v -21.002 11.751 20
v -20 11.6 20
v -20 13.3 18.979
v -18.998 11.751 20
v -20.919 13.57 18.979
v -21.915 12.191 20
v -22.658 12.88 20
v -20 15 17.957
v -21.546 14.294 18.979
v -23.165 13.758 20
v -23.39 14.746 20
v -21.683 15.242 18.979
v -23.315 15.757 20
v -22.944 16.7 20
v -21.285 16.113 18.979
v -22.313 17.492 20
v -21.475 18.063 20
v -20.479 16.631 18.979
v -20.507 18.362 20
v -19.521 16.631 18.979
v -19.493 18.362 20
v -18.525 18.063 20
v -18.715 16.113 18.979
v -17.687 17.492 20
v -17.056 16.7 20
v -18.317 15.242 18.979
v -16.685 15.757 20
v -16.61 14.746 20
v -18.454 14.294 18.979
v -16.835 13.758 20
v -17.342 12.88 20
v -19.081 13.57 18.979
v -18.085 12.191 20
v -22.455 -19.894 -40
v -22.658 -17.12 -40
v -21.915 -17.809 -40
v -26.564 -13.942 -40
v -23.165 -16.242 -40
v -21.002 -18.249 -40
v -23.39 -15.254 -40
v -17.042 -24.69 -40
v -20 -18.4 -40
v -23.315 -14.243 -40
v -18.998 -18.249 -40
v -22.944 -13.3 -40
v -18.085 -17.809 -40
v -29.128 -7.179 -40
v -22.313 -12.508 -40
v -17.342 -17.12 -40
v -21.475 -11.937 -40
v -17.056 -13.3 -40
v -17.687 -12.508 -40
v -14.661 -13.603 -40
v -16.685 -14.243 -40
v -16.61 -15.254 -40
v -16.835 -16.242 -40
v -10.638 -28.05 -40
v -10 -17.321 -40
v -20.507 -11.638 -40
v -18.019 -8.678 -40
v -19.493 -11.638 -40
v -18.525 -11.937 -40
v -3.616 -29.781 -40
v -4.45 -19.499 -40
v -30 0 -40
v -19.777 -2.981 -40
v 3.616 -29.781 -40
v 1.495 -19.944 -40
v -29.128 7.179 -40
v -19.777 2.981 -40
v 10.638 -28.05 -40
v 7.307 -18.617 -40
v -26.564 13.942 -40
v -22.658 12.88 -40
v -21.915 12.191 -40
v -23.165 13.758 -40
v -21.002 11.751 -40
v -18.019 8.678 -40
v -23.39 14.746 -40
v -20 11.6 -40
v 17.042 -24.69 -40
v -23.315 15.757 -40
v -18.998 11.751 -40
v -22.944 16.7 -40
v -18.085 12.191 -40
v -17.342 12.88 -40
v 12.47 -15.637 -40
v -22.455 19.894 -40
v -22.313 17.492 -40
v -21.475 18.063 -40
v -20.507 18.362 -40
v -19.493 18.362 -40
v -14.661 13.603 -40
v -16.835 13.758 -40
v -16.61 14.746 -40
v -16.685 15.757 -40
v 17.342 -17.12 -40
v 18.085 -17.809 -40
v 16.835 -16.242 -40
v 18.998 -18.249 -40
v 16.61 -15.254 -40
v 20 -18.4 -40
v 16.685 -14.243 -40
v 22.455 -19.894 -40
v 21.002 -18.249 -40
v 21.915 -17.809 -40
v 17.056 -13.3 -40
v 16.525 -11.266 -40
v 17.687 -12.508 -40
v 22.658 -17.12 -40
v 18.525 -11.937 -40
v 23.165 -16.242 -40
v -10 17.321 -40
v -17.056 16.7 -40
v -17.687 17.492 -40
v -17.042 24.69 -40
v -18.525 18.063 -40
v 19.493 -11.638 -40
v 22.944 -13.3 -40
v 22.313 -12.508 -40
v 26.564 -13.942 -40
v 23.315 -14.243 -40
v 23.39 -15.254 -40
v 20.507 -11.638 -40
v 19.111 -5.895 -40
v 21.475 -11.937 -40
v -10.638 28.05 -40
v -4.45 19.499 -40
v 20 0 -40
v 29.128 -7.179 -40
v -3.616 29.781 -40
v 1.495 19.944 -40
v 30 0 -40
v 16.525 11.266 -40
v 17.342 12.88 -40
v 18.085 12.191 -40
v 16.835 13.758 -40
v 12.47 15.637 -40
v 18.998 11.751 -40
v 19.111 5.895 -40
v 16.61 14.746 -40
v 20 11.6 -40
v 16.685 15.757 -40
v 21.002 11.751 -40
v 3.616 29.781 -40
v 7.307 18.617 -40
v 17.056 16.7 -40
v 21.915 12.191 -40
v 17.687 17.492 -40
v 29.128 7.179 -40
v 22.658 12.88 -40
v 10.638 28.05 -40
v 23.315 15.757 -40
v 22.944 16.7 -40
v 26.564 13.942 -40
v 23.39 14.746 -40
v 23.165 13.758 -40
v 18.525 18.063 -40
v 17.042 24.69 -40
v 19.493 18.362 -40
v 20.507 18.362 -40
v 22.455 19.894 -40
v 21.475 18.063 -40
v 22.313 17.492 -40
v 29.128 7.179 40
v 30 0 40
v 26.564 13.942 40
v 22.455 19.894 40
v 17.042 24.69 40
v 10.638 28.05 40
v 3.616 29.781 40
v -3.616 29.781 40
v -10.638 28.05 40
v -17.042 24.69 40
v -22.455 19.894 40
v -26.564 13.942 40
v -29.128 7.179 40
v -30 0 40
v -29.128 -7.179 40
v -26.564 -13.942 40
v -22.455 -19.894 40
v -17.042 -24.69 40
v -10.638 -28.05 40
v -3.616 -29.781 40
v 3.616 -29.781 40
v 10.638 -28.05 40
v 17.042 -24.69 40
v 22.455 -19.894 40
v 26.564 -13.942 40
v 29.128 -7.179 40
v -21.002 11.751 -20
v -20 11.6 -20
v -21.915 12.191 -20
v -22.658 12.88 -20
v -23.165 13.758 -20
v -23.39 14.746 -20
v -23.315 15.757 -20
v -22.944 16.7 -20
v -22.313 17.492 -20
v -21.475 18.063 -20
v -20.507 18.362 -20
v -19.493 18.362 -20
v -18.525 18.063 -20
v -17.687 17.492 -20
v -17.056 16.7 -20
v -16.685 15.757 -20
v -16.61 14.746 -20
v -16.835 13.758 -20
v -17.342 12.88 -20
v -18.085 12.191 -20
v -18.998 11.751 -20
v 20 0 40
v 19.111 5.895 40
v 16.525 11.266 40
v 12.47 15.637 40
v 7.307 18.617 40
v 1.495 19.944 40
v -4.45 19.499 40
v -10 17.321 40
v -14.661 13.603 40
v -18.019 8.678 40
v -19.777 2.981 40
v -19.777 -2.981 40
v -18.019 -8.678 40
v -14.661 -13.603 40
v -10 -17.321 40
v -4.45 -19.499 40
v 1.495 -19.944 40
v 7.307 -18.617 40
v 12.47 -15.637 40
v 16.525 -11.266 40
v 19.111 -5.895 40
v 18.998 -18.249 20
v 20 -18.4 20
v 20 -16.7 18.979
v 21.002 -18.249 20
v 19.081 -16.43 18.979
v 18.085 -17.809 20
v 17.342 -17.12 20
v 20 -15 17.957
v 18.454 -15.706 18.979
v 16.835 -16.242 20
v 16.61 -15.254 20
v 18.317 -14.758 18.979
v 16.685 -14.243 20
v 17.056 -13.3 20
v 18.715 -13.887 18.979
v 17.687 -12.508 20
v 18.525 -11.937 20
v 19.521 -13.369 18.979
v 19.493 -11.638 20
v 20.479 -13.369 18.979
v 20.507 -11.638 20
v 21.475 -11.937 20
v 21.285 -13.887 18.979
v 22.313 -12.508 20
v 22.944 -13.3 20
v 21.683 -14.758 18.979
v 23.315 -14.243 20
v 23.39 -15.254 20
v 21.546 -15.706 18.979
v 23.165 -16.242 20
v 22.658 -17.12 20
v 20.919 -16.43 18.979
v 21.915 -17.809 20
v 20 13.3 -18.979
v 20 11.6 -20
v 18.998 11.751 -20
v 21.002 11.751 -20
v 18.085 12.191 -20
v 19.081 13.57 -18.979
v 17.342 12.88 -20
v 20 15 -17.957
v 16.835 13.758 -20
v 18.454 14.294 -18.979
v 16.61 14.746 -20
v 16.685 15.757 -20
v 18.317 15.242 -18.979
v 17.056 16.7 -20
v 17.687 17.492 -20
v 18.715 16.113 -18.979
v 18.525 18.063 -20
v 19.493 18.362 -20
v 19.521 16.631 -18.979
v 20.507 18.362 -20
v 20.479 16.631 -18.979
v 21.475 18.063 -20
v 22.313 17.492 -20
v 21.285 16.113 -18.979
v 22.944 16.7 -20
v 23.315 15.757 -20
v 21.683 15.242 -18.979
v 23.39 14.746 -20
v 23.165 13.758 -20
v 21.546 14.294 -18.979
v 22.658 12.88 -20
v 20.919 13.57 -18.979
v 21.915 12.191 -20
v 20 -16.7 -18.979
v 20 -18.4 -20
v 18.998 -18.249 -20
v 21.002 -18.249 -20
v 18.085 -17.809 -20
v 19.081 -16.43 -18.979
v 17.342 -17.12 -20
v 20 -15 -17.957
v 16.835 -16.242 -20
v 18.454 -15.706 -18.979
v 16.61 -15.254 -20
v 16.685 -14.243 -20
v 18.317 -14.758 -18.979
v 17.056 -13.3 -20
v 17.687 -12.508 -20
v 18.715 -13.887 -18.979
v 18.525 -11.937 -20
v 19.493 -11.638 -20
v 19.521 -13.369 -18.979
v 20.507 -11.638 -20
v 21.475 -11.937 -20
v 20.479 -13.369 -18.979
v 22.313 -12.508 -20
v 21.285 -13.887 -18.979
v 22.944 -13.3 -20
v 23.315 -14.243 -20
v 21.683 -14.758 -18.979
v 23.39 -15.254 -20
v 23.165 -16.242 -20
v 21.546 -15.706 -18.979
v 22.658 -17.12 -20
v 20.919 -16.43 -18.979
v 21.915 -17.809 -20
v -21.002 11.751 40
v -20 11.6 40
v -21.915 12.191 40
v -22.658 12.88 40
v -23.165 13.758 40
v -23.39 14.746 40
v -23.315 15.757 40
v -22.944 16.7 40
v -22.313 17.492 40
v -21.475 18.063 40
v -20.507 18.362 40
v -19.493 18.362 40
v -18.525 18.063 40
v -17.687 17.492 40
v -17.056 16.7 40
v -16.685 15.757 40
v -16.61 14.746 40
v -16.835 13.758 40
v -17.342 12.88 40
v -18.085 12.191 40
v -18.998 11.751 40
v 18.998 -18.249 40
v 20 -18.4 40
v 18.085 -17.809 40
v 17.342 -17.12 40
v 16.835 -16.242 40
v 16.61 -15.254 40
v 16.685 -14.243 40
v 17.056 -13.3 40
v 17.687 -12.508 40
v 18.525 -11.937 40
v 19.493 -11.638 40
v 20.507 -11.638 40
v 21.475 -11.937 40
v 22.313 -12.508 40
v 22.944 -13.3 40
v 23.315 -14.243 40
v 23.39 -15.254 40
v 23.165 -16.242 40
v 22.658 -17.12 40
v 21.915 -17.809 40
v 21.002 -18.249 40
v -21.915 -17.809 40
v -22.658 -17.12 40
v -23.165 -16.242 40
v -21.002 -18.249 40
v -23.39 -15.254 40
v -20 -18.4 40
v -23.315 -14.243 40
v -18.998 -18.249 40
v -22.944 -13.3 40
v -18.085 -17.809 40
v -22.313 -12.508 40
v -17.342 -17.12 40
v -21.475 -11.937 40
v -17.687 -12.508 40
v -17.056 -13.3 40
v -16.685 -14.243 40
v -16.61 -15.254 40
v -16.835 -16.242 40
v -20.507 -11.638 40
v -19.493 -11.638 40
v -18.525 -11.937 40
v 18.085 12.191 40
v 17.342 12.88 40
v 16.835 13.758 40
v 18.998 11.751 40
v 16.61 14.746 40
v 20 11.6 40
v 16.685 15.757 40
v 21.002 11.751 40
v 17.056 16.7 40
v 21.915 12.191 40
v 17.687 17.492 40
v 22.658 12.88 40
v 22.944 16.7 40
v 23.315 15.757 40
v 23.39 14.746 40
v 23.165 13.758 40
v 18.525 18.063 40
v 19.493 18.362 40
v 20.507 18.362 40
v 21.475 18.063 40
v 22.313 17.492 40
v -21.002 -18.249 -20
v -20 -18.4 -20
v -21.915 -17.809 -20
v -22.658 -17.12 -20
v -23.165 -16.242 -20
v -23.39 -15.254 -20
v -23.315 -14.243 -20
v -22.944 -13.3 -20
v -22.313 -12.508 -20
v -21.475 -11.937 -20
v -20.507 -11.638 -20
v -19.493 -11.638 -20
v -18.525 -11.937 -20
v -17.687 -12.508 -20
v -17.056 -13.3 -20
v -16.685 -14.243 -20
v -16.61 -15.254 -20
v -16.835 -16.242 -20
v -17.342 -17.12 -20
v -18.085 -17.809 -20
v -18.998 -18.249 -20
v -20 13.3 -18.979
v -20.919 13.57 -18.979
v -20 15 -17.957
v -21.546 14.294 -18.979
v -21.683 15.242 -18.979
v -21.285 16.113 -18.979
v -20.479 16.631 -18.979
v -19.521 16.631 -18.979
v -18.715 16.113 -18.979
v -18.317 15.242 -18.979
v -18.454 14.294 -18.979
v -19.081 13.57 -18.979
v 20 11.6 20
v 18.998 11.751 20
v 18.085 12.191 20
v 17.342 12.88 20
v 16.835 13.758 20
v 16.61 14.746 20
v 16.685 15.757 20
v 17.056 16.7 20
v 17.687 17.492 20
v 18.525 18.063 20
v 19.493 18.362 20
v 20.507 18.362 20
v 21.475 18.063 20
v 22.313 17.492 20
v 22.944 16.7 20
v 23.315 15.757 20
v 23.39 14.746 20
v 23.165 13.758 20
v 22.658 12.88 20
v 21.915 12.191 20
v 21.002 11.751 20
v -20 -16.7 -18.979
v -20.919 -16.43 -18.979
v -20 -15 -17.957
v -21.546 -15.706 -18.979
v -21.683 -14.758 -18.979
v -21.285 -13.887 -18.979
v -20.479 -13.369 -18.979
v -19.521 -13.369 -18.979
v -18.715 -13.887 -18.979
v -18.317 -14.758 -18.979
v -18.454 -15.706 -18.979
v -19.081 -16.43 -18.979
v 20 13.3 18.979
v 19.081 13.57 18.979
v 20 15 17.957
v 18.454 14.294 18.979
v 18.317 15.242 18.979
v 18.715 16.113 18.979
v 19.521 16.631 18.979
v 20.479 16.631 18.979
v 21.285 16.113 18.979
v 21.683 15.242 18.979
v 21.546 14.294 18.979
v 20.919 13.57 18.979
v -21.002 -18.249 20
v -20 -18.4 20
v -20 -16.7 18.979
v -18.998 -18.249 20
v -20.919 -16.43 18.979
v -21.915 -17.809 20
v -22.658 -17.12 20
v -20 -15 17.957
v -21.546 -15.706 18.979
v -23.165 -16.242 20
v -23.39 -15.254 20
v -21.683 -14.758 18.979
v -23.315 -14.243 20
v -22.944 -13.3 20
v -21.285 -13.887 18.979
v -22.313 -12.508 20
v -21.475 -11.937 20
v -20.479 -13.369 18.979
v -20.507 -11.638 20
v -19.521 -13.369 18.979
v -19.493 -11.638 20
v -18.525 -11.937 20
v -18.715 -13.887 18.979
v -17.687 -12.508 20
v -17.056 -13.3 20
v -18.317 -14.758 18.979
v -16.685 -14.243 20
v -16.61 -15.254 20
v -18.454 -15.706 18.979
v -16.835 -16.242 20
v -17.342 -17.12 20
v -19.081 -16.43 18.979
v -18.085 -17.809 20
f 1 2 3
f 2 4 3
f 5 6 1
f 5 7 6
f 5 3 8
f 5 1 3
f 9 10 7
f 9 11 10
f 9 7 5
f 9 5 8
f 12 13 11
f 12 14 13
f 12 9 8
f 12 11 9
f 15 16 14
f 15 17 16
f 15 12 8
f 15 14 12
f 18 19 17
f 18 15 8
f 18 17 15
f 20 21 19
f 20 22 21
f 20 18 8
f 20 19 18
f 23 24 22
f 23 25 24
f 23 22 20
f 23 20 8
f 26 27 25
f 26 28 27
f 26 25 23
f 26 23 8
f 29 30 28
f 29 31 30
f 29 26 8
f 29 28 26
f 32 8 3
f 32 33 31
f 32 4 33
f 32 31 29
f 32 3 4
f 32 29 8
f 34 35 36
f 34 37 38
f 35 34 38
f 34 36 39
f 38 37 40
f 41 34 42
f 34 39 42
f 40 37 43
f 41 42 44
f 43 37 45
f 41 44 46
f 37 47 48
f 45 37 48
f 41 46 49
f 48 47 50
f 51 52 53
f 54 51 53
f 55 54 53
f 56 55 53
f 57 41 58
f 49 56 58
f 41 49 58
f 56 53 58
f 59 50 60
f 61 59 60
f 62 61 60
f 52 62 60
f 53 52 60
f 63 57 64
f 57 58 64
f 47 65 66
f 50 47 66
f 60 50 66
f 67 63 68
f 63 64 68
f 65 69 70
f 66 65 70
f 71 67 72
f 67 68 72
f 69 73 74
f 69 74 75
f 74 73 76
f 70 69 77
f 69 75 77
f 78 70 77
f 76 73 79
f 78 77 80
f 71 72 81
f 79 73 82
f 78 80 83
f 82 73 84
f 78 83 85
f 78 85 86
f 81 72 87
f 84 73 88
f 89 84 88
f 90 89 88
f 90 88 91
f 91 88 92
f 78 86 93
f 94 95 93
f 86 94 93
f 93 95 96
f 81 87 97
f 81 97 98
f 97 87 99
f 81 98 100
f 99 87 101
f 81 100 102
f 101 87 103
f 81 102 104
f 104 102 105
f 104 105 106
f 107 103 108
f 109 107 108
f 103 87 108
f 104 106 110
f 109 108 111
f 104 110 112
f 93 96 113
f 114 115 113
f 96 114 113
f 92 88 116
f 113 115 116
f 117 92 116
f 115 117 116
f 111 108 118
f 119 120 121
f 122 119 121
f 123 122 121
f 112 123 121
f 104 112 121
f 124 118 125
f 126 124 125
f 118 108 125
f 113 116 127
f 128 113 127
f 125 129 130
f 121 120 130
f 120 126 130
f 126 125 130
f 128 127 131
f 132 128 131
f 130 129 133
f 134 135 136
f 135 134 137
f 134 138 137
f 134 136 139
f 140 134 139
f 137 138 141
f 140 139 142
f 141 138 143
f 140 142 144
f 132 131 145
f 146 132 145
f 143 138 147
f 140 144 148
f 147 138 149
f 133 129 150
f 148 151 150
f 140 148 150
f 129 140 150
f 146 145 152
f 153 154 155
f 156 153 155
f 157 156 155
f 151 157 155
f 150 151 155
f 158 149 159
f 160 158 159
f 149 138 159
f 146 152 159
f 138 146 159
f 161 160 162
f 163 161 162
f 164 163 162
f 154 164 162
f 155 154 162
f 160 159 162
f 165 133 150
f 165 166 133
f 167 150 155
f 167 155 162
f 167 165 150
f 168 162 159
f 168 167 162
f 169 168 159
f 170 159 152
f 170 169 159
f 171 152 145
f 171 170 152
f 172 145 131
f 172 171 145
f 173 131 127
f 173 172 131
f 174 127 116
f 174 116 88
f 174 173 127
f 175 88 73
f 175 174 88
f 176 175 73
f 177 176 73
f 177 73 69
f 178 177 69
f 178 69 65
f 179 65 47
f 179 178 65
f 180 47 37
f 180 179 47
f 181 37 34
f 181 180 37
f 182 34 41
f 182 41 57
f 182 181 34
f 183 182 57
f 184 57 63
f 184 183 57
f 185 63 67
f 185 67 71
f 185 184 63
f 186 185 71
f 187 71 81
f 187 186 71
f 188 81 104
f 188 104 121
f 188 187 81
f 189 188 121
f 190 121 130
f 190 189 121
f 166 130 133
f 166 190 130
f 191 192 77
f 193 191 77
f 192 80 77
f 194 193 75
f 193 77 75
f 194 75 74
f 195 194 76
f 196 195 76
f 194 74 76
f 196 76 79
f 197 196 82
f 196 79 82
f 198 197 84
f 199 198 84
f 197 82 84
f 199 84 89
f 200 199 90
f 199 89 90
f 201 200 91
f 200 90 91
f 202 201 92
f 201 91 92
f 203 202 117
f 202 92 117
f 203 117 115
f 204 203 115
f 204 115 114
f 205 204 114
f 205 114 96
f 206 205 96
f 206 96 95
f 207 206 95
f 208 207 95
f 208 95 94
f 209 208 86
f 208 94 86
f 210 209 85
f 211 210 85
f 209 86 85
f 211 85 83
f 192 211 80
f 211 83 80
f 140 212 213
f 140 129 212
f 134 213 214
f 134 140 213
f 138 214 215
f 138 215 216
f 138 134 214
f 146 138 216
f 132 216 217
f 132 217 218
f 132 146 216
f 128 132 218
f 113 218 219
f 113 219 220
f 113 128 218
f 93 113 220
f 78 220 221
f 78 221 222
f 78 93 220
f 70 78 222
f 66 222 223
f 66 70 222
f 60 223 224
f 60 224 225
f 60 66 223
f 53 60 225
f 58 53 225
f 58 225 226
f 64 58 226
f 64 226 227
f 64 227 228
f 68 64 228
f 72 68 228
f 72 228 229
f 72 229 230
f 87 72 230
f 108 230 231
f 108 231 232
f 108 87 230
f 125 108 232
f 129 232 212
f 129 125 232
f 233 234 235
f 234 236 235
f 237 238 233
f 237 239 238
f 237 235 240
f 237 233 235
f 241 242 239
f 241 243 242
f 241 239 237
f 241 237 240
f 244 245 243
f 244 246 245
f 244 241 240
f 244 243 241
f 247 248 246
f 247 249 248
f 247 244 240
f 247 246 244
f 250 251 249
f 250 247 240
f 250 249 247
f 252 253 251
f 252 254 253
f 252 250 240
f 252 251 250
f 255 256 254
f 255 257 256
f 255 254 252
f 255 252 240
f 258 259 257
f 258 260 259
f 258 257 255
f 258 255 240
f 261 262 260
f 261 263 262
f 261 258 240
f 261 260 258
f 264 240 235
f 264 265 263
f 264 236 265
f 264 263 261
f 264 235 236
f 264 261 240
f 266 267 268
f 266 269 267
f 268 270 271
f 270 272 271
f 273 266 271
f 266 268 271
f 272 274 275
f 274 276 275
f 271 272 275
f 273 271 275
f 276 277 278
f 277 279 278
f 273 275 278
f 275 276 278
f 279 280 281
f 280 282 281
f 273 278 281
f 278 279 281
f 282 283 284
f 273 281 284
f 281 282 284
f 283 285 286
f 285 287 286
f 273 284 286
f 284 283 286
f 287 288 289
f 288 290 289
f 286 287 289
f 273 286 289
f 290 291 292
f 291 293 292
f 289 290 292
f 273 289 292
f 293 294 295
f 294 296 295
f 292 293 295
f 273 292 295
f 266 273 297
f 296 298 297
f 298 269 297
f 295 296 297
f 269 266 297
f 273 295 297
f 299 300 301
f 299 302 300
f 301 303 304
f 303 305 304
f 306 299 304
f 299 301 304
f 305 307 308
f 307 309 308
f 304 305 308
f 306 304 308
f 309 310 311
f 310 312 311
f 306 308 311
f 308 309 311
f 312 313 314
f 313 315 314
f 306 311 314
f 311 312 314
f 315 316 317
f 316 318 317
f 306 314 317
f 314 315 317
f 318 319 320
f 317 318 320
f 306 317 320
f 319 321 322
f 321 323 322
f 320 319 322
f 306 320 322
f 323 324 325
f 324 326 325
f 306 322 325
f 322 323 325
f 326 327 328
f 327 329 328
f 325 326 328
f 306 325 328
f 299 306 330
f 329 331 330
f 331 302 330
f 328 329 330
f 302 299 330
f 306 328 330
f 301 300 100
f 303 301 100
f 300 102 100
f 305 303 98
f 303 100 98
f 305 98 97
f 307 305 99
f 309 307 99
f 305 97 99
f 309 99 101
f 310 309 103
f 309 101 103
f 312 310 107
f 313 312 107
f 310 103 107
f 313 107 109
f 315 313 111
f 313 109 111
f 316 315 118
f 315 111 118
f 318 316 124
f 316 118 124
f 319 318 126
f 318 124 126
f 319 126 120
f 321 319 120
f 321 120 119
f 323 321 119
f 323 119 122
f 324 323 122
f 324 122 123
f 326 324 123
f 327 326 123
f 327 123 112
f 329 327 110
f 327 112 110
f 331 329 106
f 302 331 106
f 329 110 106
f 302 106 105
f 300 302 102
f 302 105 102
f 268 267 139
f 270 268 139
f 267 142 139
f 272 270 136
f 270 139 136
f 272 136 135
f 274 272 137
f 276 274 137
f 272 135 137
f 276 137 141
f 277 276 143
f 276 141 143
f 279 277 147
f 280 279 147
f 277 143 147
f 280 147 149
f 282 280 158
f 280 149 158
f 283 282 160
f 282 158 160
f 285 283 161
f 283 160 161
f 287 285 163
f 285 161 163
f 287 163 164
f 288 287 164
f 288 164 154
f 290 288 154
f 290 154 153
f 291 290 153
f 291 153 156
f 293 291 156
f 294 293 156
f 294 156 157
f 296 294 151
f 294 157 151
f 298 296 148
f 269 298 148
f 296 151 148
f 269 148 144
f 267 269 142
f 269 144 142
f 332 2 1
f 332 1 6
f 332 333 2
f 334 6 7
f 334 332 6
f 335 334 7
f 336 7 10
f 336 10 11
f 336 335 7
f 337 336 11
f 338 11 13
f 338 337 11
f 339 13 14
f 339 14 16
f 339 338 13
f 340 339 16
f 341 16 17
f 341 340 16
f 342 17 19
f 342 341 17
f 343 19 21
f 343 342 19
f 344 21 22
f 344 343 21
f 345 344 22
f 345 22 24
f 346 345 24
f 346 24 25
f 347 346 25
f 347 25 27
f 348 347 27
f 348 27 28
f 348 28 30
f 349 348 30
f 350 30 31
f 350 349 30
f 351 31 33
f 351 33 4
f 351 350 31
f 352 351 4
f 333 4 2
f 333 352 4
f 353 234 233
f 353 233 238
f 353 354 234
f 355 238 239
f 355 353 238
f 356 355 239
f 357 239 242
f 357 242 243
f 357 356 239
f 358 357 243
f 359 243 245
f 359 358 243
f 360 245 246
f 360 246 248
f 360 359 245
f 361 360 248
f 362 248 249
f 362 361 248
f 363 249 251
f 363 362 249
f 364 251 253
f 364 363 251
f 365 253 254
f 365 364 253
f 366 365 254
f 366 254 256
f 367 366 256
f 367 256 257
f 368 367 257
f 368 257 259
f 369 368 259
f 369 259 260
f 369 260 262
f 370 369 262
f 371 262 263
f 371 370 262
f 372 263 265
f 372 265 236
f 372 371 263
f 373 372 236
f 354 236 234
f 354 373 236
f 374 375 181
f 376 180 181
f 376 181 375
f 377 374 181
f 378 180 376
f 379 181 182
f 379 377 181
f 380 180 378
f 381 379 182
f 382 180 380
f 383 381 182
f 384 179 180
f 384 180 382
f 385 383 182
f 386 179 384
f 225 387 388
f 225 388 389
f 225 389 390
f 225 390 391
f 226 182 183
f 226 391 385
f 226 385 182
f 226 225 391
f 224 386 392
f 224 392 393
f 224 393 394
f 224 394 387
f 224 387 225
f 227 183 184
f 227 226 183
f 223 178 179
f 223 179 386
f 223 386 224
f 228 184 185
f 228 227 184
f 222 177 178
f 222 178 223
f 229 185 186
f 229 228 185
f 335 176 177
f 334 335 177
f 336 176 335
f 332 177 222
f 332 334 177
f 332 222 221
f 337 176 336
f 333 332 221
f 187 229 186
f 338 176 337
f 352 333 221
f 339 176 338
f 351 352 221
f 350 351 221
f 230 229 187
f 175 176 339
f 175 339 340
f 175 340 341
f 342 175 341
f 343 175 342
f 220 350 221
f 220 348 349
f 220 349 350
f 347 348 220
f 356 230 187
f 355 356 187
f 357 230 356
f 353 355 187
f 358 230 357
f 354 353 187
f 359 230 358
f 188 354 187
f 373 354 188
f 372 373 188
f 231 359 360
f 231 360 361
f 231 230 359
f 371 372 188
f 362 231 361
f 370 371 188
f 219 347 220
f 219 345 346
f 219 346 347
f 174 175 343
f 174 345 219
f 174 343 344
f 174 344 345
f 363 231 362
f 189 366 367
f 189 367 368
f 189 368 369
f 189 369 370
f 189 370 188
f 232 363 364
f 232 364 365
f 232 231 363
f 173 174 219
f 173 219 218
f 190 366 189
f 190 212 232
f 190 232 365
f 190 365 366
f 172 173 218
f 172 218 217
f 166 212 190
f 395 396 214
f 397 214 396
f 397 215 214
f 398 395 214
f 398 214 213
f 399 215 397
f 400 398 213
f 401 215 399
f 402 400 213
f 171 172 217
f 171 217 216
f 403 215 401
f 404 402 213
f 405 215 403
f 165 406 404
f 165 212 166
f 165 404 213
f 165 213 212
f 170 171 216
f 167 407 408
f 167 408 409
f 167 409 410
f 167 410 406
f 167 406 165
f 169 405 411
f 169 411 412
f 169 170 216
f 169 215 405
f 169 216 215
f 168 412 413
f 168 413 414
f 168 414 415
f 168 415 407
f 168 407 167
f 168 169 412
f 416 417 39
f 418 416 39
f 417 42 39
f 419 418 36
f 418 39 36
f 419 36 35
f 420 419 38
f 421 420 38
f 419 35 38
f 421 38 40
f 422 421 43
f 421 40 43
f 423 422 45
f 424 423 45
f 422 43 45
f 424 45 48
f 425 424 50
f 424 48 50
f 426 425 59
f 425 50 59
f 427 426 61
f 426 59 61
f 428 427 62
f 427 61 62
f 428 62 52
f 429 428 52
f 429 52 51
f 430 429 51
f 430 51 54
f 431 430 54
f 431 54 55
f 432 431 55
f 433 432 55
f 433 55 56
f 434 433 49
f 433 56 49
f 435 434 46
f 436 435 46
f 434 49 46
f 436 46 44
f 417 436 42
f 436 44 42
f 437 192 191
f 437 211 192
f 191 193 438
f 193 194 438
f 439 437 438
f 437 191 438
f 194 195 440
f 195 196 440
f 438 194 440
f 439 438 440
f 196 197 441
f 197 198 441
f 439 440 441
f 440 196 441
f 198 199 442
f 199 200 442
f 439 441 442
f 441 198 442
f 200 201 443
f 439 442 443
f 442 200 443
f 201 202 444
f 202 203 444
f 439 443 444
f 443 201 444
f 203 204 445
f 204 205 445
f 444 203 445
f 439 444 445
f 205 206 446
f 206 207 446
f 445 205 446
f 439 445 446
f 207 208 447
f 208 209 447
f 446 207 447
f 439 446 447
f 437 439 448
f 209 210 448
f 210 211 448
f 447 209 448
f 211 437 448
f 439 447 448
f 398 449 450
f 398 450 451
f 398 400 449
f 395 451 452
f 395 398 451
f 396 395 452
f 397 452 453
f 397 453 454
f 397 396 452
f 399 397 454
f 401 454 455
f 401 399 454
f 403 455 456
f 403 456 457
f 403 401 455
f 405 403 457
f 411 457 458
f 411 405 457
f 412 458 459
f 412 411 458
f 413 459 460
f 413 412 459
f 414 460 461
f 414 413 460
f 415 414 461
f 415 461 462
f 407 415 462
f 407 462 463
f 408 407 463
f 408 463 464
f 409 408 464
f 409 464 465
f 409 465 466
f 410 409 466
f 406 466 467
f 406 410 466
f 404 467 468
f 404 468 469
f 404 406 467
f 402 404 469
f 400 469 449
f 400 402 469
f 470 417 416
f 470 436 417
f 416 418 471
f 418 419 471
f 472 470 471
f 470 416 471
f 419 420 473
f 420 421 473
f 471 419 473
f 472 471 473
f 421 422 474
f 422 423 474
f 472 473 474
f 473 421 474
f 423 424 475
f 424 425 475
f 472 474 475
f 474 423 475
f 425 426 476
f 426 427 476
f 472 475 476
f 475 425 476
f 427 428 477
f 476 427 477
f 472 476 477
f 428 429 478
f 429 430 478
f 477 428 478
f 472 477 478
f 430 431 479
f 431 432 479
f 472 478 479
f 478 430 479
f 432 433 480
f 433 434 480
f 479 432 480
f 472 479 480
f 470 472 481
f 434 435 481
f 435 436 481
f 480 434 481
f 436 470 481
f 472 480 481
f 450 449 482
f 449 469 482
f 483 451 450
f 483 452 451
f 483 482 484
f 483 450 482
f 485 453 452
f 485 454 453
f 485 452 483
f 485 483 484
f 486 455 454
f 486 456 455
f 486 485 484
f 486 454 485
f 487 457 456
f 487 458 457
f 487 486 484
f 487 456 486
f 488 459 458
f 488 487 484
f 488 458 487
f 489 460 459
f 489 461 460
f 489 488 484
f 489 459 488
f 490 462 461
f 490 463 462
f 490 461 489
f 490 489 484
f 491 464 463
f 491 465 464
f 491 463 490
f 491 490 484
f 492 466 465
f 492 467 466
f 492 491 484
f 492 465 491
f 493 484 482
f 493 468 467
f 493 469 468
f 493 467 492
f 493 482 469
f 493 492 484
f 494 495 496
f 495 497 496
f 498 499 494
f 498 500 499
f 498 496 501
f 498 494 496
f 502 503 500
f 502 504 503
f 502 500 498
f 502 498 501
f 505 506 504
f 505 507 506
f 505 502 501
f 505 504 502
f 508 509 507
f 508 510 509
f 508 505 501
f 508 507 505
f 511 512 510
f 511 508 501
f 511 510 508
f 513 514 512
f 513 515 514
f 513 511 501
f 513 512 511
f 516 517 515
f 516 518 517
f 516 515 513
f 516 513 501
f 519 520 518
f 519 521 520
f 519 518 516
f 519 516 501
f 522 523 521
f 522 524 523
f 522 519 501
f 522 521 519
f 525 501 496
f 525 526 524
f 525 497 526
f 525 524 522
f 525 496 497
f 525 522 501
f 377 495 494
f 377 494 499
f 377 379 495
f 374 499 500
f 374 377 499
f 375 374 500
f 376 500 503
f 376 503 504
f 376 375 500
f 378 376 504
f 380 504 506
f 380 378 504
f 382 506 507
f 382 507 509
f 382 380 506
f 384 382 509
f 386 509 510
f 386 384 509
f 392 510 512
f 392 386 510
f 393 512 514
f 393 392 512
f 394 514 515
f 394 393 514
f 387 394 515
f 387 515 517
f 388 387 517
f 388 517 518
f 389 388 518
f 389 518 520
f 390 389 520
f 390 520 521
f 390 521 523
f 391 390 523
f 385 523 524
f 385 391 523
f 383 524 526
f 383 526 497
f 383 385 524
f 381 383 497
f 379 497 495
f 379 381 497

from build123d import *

# Parameters (mm, degrees)
SKETCH1_R                             = 30
SKETCH1_R_2                           = 20
BOSS_EXTRUDE1_DEPTH                   = 40
TAP_DRILL_FOR_M8X1_25_TAP1_AT_2_COUNT = 2
TAP_DRILL_FOR_M8X1_25_TAP1_AT_2_PITCH = 40
TAP_DRILL_FOR_M8X1_25_TAP1_AT_3_COUNT = 2
TAP_DRILL_FOR_M8X1_25_TAP1_AT_3_PITCH = 50
TAP_DRILL_FOR_M8X1_25_TAP1_AT_4_COUNT = 2
TAP_DRILL_FOR_M8X1_25_TAP1_AT_4_PITCH = 30


with BuildPart() as part:
    # Sketch1 → Boss-Extrude1 (new, symmetric)
    with BuildSketch(Plane.XY):
        Circle(SKETCH1_R)
        Circle(SKETCH1_R_2, mode=Mode.SUBTRACT)
    extrude(amount=BOSS_EXTRUDE1_DEPTH, both=True)

    # Sketch12 → Tap Drill for M8x1.25 Tap1 (revolve, cut)
    with BuildSketch(Plane(origin=(-20, 15, 40), x_dir=(0, -1, 0), z_dir=(1, 0, 0))):
        Polygon((0, 0), (0, 22.042926105), (3.4, 20), (3.4, 0), align=None)
    tap_drill_for_m8x1_25_tap1 = revolve(axis=Axis((-20, 15, 46.35), (0, 0, -1)), mode=Mode.SUBTRACT)

    # Tap Drill for M8x1.25 Tap1 at 2: Tap Drill for M8x1.25 Tap1 ×2
    with Locations(*[(i * TAP_DRILL_FOR_M8X1_25_TAP1_AT_2_PITCH, 0, 0) for i in range(1, TAP_DRILL_FOR_M8X1_25_TAP1_AT_2_COUNT)]):
        add(tap_drill_for_m8x1_25_tap1, mode=Mode.SUBTRACT)

    # Tap Drill for M8x1.25 Tap1 at 3: Tap Drill for M8x1.25 Tap1 ×2
    with Locations(*[Vector(0.7999999999999999, -0.6000000000000001, 0) * (i * TAP_DRILL_FOR_M8X1_25_TAP1_AT_3_PITCH) for i in range(1, TAP_DRILL_FOR_M8X1_25_TAP1_AT_3_COUNT)]):
        add(tap_drill_for_m8x1_25_tap1, mode=Mode.SUBTRACT)

    # Tap Drill for M8x1.25 Tap1 at 4: Tap Drill for M8x1.25 Tap1 ×2
    with Locations(*[(0, -i * TAP_DRILL_FOR_M8X1_25_TAP1_AT_4_PITCH, 0) for i in range(1, TAP_DRILL_FOR_M8X1_25_TAP1_AT_4_COUNT)]):
        add(tap_drill_for_m8x1_25_tap1, mode=Mode.SUBTRACT)

    # Mirror1: Tap Drill for M8x1.25 Tap1 across plane
    add(tap_drill_for_m8x1_25_tap1.mirror(Plane.XY), mode=Mode.SUBTRACT)

    # Mirror1 copy 1 sketch → Mirror1 copy 1 (revolve, cut)
    with BuildSketch(Plane(origin=(20, 15, -40), x_dir=(0, -1, 0), z_dir=(1, 0, 0))):
        Polygon((0, 0), (0, -22.042926105), (3.4, -20), (3.4, 0), align=None)
    revolve(axis=Axis((20, 15, -46.35), (0, 0, -1)), mode=Mode.SUBTRACT)

    # Mirror1 copy 2 sketch → Mirror1 copy 2 (revolve, cut)
    with BuildSketch(Plane(origin=(20, -15, -40), x_dir=(0, -1, 0), z_dir=(1, 0, 0))):
        Polygon((0, 0), (0, -22.042926105), (3.4, -20), (3.4, 0), align=None)
    revolve(axis=Axis((20, -15, -46.35), (0, 0, -1)), mode=Mode.SUBTRACT)

    # Mirror1 copy 3 sketch → Mirror1 copy 3 (revolve, cut)
    with BuildSketch(Plane(origin=(-20, -15, -40), x_dir=(0, -1, 0), z_dir=(1, 0, 0))):
        Polygon((0, 0), (0, -22.042926105), (3.4, -20), (3.4, 0), align=None)
    revolve(axis=Axis((-20, -15, -46.35), (0, 0, -1)), mode=Mode.SUBTRACT)


solid = part.part
